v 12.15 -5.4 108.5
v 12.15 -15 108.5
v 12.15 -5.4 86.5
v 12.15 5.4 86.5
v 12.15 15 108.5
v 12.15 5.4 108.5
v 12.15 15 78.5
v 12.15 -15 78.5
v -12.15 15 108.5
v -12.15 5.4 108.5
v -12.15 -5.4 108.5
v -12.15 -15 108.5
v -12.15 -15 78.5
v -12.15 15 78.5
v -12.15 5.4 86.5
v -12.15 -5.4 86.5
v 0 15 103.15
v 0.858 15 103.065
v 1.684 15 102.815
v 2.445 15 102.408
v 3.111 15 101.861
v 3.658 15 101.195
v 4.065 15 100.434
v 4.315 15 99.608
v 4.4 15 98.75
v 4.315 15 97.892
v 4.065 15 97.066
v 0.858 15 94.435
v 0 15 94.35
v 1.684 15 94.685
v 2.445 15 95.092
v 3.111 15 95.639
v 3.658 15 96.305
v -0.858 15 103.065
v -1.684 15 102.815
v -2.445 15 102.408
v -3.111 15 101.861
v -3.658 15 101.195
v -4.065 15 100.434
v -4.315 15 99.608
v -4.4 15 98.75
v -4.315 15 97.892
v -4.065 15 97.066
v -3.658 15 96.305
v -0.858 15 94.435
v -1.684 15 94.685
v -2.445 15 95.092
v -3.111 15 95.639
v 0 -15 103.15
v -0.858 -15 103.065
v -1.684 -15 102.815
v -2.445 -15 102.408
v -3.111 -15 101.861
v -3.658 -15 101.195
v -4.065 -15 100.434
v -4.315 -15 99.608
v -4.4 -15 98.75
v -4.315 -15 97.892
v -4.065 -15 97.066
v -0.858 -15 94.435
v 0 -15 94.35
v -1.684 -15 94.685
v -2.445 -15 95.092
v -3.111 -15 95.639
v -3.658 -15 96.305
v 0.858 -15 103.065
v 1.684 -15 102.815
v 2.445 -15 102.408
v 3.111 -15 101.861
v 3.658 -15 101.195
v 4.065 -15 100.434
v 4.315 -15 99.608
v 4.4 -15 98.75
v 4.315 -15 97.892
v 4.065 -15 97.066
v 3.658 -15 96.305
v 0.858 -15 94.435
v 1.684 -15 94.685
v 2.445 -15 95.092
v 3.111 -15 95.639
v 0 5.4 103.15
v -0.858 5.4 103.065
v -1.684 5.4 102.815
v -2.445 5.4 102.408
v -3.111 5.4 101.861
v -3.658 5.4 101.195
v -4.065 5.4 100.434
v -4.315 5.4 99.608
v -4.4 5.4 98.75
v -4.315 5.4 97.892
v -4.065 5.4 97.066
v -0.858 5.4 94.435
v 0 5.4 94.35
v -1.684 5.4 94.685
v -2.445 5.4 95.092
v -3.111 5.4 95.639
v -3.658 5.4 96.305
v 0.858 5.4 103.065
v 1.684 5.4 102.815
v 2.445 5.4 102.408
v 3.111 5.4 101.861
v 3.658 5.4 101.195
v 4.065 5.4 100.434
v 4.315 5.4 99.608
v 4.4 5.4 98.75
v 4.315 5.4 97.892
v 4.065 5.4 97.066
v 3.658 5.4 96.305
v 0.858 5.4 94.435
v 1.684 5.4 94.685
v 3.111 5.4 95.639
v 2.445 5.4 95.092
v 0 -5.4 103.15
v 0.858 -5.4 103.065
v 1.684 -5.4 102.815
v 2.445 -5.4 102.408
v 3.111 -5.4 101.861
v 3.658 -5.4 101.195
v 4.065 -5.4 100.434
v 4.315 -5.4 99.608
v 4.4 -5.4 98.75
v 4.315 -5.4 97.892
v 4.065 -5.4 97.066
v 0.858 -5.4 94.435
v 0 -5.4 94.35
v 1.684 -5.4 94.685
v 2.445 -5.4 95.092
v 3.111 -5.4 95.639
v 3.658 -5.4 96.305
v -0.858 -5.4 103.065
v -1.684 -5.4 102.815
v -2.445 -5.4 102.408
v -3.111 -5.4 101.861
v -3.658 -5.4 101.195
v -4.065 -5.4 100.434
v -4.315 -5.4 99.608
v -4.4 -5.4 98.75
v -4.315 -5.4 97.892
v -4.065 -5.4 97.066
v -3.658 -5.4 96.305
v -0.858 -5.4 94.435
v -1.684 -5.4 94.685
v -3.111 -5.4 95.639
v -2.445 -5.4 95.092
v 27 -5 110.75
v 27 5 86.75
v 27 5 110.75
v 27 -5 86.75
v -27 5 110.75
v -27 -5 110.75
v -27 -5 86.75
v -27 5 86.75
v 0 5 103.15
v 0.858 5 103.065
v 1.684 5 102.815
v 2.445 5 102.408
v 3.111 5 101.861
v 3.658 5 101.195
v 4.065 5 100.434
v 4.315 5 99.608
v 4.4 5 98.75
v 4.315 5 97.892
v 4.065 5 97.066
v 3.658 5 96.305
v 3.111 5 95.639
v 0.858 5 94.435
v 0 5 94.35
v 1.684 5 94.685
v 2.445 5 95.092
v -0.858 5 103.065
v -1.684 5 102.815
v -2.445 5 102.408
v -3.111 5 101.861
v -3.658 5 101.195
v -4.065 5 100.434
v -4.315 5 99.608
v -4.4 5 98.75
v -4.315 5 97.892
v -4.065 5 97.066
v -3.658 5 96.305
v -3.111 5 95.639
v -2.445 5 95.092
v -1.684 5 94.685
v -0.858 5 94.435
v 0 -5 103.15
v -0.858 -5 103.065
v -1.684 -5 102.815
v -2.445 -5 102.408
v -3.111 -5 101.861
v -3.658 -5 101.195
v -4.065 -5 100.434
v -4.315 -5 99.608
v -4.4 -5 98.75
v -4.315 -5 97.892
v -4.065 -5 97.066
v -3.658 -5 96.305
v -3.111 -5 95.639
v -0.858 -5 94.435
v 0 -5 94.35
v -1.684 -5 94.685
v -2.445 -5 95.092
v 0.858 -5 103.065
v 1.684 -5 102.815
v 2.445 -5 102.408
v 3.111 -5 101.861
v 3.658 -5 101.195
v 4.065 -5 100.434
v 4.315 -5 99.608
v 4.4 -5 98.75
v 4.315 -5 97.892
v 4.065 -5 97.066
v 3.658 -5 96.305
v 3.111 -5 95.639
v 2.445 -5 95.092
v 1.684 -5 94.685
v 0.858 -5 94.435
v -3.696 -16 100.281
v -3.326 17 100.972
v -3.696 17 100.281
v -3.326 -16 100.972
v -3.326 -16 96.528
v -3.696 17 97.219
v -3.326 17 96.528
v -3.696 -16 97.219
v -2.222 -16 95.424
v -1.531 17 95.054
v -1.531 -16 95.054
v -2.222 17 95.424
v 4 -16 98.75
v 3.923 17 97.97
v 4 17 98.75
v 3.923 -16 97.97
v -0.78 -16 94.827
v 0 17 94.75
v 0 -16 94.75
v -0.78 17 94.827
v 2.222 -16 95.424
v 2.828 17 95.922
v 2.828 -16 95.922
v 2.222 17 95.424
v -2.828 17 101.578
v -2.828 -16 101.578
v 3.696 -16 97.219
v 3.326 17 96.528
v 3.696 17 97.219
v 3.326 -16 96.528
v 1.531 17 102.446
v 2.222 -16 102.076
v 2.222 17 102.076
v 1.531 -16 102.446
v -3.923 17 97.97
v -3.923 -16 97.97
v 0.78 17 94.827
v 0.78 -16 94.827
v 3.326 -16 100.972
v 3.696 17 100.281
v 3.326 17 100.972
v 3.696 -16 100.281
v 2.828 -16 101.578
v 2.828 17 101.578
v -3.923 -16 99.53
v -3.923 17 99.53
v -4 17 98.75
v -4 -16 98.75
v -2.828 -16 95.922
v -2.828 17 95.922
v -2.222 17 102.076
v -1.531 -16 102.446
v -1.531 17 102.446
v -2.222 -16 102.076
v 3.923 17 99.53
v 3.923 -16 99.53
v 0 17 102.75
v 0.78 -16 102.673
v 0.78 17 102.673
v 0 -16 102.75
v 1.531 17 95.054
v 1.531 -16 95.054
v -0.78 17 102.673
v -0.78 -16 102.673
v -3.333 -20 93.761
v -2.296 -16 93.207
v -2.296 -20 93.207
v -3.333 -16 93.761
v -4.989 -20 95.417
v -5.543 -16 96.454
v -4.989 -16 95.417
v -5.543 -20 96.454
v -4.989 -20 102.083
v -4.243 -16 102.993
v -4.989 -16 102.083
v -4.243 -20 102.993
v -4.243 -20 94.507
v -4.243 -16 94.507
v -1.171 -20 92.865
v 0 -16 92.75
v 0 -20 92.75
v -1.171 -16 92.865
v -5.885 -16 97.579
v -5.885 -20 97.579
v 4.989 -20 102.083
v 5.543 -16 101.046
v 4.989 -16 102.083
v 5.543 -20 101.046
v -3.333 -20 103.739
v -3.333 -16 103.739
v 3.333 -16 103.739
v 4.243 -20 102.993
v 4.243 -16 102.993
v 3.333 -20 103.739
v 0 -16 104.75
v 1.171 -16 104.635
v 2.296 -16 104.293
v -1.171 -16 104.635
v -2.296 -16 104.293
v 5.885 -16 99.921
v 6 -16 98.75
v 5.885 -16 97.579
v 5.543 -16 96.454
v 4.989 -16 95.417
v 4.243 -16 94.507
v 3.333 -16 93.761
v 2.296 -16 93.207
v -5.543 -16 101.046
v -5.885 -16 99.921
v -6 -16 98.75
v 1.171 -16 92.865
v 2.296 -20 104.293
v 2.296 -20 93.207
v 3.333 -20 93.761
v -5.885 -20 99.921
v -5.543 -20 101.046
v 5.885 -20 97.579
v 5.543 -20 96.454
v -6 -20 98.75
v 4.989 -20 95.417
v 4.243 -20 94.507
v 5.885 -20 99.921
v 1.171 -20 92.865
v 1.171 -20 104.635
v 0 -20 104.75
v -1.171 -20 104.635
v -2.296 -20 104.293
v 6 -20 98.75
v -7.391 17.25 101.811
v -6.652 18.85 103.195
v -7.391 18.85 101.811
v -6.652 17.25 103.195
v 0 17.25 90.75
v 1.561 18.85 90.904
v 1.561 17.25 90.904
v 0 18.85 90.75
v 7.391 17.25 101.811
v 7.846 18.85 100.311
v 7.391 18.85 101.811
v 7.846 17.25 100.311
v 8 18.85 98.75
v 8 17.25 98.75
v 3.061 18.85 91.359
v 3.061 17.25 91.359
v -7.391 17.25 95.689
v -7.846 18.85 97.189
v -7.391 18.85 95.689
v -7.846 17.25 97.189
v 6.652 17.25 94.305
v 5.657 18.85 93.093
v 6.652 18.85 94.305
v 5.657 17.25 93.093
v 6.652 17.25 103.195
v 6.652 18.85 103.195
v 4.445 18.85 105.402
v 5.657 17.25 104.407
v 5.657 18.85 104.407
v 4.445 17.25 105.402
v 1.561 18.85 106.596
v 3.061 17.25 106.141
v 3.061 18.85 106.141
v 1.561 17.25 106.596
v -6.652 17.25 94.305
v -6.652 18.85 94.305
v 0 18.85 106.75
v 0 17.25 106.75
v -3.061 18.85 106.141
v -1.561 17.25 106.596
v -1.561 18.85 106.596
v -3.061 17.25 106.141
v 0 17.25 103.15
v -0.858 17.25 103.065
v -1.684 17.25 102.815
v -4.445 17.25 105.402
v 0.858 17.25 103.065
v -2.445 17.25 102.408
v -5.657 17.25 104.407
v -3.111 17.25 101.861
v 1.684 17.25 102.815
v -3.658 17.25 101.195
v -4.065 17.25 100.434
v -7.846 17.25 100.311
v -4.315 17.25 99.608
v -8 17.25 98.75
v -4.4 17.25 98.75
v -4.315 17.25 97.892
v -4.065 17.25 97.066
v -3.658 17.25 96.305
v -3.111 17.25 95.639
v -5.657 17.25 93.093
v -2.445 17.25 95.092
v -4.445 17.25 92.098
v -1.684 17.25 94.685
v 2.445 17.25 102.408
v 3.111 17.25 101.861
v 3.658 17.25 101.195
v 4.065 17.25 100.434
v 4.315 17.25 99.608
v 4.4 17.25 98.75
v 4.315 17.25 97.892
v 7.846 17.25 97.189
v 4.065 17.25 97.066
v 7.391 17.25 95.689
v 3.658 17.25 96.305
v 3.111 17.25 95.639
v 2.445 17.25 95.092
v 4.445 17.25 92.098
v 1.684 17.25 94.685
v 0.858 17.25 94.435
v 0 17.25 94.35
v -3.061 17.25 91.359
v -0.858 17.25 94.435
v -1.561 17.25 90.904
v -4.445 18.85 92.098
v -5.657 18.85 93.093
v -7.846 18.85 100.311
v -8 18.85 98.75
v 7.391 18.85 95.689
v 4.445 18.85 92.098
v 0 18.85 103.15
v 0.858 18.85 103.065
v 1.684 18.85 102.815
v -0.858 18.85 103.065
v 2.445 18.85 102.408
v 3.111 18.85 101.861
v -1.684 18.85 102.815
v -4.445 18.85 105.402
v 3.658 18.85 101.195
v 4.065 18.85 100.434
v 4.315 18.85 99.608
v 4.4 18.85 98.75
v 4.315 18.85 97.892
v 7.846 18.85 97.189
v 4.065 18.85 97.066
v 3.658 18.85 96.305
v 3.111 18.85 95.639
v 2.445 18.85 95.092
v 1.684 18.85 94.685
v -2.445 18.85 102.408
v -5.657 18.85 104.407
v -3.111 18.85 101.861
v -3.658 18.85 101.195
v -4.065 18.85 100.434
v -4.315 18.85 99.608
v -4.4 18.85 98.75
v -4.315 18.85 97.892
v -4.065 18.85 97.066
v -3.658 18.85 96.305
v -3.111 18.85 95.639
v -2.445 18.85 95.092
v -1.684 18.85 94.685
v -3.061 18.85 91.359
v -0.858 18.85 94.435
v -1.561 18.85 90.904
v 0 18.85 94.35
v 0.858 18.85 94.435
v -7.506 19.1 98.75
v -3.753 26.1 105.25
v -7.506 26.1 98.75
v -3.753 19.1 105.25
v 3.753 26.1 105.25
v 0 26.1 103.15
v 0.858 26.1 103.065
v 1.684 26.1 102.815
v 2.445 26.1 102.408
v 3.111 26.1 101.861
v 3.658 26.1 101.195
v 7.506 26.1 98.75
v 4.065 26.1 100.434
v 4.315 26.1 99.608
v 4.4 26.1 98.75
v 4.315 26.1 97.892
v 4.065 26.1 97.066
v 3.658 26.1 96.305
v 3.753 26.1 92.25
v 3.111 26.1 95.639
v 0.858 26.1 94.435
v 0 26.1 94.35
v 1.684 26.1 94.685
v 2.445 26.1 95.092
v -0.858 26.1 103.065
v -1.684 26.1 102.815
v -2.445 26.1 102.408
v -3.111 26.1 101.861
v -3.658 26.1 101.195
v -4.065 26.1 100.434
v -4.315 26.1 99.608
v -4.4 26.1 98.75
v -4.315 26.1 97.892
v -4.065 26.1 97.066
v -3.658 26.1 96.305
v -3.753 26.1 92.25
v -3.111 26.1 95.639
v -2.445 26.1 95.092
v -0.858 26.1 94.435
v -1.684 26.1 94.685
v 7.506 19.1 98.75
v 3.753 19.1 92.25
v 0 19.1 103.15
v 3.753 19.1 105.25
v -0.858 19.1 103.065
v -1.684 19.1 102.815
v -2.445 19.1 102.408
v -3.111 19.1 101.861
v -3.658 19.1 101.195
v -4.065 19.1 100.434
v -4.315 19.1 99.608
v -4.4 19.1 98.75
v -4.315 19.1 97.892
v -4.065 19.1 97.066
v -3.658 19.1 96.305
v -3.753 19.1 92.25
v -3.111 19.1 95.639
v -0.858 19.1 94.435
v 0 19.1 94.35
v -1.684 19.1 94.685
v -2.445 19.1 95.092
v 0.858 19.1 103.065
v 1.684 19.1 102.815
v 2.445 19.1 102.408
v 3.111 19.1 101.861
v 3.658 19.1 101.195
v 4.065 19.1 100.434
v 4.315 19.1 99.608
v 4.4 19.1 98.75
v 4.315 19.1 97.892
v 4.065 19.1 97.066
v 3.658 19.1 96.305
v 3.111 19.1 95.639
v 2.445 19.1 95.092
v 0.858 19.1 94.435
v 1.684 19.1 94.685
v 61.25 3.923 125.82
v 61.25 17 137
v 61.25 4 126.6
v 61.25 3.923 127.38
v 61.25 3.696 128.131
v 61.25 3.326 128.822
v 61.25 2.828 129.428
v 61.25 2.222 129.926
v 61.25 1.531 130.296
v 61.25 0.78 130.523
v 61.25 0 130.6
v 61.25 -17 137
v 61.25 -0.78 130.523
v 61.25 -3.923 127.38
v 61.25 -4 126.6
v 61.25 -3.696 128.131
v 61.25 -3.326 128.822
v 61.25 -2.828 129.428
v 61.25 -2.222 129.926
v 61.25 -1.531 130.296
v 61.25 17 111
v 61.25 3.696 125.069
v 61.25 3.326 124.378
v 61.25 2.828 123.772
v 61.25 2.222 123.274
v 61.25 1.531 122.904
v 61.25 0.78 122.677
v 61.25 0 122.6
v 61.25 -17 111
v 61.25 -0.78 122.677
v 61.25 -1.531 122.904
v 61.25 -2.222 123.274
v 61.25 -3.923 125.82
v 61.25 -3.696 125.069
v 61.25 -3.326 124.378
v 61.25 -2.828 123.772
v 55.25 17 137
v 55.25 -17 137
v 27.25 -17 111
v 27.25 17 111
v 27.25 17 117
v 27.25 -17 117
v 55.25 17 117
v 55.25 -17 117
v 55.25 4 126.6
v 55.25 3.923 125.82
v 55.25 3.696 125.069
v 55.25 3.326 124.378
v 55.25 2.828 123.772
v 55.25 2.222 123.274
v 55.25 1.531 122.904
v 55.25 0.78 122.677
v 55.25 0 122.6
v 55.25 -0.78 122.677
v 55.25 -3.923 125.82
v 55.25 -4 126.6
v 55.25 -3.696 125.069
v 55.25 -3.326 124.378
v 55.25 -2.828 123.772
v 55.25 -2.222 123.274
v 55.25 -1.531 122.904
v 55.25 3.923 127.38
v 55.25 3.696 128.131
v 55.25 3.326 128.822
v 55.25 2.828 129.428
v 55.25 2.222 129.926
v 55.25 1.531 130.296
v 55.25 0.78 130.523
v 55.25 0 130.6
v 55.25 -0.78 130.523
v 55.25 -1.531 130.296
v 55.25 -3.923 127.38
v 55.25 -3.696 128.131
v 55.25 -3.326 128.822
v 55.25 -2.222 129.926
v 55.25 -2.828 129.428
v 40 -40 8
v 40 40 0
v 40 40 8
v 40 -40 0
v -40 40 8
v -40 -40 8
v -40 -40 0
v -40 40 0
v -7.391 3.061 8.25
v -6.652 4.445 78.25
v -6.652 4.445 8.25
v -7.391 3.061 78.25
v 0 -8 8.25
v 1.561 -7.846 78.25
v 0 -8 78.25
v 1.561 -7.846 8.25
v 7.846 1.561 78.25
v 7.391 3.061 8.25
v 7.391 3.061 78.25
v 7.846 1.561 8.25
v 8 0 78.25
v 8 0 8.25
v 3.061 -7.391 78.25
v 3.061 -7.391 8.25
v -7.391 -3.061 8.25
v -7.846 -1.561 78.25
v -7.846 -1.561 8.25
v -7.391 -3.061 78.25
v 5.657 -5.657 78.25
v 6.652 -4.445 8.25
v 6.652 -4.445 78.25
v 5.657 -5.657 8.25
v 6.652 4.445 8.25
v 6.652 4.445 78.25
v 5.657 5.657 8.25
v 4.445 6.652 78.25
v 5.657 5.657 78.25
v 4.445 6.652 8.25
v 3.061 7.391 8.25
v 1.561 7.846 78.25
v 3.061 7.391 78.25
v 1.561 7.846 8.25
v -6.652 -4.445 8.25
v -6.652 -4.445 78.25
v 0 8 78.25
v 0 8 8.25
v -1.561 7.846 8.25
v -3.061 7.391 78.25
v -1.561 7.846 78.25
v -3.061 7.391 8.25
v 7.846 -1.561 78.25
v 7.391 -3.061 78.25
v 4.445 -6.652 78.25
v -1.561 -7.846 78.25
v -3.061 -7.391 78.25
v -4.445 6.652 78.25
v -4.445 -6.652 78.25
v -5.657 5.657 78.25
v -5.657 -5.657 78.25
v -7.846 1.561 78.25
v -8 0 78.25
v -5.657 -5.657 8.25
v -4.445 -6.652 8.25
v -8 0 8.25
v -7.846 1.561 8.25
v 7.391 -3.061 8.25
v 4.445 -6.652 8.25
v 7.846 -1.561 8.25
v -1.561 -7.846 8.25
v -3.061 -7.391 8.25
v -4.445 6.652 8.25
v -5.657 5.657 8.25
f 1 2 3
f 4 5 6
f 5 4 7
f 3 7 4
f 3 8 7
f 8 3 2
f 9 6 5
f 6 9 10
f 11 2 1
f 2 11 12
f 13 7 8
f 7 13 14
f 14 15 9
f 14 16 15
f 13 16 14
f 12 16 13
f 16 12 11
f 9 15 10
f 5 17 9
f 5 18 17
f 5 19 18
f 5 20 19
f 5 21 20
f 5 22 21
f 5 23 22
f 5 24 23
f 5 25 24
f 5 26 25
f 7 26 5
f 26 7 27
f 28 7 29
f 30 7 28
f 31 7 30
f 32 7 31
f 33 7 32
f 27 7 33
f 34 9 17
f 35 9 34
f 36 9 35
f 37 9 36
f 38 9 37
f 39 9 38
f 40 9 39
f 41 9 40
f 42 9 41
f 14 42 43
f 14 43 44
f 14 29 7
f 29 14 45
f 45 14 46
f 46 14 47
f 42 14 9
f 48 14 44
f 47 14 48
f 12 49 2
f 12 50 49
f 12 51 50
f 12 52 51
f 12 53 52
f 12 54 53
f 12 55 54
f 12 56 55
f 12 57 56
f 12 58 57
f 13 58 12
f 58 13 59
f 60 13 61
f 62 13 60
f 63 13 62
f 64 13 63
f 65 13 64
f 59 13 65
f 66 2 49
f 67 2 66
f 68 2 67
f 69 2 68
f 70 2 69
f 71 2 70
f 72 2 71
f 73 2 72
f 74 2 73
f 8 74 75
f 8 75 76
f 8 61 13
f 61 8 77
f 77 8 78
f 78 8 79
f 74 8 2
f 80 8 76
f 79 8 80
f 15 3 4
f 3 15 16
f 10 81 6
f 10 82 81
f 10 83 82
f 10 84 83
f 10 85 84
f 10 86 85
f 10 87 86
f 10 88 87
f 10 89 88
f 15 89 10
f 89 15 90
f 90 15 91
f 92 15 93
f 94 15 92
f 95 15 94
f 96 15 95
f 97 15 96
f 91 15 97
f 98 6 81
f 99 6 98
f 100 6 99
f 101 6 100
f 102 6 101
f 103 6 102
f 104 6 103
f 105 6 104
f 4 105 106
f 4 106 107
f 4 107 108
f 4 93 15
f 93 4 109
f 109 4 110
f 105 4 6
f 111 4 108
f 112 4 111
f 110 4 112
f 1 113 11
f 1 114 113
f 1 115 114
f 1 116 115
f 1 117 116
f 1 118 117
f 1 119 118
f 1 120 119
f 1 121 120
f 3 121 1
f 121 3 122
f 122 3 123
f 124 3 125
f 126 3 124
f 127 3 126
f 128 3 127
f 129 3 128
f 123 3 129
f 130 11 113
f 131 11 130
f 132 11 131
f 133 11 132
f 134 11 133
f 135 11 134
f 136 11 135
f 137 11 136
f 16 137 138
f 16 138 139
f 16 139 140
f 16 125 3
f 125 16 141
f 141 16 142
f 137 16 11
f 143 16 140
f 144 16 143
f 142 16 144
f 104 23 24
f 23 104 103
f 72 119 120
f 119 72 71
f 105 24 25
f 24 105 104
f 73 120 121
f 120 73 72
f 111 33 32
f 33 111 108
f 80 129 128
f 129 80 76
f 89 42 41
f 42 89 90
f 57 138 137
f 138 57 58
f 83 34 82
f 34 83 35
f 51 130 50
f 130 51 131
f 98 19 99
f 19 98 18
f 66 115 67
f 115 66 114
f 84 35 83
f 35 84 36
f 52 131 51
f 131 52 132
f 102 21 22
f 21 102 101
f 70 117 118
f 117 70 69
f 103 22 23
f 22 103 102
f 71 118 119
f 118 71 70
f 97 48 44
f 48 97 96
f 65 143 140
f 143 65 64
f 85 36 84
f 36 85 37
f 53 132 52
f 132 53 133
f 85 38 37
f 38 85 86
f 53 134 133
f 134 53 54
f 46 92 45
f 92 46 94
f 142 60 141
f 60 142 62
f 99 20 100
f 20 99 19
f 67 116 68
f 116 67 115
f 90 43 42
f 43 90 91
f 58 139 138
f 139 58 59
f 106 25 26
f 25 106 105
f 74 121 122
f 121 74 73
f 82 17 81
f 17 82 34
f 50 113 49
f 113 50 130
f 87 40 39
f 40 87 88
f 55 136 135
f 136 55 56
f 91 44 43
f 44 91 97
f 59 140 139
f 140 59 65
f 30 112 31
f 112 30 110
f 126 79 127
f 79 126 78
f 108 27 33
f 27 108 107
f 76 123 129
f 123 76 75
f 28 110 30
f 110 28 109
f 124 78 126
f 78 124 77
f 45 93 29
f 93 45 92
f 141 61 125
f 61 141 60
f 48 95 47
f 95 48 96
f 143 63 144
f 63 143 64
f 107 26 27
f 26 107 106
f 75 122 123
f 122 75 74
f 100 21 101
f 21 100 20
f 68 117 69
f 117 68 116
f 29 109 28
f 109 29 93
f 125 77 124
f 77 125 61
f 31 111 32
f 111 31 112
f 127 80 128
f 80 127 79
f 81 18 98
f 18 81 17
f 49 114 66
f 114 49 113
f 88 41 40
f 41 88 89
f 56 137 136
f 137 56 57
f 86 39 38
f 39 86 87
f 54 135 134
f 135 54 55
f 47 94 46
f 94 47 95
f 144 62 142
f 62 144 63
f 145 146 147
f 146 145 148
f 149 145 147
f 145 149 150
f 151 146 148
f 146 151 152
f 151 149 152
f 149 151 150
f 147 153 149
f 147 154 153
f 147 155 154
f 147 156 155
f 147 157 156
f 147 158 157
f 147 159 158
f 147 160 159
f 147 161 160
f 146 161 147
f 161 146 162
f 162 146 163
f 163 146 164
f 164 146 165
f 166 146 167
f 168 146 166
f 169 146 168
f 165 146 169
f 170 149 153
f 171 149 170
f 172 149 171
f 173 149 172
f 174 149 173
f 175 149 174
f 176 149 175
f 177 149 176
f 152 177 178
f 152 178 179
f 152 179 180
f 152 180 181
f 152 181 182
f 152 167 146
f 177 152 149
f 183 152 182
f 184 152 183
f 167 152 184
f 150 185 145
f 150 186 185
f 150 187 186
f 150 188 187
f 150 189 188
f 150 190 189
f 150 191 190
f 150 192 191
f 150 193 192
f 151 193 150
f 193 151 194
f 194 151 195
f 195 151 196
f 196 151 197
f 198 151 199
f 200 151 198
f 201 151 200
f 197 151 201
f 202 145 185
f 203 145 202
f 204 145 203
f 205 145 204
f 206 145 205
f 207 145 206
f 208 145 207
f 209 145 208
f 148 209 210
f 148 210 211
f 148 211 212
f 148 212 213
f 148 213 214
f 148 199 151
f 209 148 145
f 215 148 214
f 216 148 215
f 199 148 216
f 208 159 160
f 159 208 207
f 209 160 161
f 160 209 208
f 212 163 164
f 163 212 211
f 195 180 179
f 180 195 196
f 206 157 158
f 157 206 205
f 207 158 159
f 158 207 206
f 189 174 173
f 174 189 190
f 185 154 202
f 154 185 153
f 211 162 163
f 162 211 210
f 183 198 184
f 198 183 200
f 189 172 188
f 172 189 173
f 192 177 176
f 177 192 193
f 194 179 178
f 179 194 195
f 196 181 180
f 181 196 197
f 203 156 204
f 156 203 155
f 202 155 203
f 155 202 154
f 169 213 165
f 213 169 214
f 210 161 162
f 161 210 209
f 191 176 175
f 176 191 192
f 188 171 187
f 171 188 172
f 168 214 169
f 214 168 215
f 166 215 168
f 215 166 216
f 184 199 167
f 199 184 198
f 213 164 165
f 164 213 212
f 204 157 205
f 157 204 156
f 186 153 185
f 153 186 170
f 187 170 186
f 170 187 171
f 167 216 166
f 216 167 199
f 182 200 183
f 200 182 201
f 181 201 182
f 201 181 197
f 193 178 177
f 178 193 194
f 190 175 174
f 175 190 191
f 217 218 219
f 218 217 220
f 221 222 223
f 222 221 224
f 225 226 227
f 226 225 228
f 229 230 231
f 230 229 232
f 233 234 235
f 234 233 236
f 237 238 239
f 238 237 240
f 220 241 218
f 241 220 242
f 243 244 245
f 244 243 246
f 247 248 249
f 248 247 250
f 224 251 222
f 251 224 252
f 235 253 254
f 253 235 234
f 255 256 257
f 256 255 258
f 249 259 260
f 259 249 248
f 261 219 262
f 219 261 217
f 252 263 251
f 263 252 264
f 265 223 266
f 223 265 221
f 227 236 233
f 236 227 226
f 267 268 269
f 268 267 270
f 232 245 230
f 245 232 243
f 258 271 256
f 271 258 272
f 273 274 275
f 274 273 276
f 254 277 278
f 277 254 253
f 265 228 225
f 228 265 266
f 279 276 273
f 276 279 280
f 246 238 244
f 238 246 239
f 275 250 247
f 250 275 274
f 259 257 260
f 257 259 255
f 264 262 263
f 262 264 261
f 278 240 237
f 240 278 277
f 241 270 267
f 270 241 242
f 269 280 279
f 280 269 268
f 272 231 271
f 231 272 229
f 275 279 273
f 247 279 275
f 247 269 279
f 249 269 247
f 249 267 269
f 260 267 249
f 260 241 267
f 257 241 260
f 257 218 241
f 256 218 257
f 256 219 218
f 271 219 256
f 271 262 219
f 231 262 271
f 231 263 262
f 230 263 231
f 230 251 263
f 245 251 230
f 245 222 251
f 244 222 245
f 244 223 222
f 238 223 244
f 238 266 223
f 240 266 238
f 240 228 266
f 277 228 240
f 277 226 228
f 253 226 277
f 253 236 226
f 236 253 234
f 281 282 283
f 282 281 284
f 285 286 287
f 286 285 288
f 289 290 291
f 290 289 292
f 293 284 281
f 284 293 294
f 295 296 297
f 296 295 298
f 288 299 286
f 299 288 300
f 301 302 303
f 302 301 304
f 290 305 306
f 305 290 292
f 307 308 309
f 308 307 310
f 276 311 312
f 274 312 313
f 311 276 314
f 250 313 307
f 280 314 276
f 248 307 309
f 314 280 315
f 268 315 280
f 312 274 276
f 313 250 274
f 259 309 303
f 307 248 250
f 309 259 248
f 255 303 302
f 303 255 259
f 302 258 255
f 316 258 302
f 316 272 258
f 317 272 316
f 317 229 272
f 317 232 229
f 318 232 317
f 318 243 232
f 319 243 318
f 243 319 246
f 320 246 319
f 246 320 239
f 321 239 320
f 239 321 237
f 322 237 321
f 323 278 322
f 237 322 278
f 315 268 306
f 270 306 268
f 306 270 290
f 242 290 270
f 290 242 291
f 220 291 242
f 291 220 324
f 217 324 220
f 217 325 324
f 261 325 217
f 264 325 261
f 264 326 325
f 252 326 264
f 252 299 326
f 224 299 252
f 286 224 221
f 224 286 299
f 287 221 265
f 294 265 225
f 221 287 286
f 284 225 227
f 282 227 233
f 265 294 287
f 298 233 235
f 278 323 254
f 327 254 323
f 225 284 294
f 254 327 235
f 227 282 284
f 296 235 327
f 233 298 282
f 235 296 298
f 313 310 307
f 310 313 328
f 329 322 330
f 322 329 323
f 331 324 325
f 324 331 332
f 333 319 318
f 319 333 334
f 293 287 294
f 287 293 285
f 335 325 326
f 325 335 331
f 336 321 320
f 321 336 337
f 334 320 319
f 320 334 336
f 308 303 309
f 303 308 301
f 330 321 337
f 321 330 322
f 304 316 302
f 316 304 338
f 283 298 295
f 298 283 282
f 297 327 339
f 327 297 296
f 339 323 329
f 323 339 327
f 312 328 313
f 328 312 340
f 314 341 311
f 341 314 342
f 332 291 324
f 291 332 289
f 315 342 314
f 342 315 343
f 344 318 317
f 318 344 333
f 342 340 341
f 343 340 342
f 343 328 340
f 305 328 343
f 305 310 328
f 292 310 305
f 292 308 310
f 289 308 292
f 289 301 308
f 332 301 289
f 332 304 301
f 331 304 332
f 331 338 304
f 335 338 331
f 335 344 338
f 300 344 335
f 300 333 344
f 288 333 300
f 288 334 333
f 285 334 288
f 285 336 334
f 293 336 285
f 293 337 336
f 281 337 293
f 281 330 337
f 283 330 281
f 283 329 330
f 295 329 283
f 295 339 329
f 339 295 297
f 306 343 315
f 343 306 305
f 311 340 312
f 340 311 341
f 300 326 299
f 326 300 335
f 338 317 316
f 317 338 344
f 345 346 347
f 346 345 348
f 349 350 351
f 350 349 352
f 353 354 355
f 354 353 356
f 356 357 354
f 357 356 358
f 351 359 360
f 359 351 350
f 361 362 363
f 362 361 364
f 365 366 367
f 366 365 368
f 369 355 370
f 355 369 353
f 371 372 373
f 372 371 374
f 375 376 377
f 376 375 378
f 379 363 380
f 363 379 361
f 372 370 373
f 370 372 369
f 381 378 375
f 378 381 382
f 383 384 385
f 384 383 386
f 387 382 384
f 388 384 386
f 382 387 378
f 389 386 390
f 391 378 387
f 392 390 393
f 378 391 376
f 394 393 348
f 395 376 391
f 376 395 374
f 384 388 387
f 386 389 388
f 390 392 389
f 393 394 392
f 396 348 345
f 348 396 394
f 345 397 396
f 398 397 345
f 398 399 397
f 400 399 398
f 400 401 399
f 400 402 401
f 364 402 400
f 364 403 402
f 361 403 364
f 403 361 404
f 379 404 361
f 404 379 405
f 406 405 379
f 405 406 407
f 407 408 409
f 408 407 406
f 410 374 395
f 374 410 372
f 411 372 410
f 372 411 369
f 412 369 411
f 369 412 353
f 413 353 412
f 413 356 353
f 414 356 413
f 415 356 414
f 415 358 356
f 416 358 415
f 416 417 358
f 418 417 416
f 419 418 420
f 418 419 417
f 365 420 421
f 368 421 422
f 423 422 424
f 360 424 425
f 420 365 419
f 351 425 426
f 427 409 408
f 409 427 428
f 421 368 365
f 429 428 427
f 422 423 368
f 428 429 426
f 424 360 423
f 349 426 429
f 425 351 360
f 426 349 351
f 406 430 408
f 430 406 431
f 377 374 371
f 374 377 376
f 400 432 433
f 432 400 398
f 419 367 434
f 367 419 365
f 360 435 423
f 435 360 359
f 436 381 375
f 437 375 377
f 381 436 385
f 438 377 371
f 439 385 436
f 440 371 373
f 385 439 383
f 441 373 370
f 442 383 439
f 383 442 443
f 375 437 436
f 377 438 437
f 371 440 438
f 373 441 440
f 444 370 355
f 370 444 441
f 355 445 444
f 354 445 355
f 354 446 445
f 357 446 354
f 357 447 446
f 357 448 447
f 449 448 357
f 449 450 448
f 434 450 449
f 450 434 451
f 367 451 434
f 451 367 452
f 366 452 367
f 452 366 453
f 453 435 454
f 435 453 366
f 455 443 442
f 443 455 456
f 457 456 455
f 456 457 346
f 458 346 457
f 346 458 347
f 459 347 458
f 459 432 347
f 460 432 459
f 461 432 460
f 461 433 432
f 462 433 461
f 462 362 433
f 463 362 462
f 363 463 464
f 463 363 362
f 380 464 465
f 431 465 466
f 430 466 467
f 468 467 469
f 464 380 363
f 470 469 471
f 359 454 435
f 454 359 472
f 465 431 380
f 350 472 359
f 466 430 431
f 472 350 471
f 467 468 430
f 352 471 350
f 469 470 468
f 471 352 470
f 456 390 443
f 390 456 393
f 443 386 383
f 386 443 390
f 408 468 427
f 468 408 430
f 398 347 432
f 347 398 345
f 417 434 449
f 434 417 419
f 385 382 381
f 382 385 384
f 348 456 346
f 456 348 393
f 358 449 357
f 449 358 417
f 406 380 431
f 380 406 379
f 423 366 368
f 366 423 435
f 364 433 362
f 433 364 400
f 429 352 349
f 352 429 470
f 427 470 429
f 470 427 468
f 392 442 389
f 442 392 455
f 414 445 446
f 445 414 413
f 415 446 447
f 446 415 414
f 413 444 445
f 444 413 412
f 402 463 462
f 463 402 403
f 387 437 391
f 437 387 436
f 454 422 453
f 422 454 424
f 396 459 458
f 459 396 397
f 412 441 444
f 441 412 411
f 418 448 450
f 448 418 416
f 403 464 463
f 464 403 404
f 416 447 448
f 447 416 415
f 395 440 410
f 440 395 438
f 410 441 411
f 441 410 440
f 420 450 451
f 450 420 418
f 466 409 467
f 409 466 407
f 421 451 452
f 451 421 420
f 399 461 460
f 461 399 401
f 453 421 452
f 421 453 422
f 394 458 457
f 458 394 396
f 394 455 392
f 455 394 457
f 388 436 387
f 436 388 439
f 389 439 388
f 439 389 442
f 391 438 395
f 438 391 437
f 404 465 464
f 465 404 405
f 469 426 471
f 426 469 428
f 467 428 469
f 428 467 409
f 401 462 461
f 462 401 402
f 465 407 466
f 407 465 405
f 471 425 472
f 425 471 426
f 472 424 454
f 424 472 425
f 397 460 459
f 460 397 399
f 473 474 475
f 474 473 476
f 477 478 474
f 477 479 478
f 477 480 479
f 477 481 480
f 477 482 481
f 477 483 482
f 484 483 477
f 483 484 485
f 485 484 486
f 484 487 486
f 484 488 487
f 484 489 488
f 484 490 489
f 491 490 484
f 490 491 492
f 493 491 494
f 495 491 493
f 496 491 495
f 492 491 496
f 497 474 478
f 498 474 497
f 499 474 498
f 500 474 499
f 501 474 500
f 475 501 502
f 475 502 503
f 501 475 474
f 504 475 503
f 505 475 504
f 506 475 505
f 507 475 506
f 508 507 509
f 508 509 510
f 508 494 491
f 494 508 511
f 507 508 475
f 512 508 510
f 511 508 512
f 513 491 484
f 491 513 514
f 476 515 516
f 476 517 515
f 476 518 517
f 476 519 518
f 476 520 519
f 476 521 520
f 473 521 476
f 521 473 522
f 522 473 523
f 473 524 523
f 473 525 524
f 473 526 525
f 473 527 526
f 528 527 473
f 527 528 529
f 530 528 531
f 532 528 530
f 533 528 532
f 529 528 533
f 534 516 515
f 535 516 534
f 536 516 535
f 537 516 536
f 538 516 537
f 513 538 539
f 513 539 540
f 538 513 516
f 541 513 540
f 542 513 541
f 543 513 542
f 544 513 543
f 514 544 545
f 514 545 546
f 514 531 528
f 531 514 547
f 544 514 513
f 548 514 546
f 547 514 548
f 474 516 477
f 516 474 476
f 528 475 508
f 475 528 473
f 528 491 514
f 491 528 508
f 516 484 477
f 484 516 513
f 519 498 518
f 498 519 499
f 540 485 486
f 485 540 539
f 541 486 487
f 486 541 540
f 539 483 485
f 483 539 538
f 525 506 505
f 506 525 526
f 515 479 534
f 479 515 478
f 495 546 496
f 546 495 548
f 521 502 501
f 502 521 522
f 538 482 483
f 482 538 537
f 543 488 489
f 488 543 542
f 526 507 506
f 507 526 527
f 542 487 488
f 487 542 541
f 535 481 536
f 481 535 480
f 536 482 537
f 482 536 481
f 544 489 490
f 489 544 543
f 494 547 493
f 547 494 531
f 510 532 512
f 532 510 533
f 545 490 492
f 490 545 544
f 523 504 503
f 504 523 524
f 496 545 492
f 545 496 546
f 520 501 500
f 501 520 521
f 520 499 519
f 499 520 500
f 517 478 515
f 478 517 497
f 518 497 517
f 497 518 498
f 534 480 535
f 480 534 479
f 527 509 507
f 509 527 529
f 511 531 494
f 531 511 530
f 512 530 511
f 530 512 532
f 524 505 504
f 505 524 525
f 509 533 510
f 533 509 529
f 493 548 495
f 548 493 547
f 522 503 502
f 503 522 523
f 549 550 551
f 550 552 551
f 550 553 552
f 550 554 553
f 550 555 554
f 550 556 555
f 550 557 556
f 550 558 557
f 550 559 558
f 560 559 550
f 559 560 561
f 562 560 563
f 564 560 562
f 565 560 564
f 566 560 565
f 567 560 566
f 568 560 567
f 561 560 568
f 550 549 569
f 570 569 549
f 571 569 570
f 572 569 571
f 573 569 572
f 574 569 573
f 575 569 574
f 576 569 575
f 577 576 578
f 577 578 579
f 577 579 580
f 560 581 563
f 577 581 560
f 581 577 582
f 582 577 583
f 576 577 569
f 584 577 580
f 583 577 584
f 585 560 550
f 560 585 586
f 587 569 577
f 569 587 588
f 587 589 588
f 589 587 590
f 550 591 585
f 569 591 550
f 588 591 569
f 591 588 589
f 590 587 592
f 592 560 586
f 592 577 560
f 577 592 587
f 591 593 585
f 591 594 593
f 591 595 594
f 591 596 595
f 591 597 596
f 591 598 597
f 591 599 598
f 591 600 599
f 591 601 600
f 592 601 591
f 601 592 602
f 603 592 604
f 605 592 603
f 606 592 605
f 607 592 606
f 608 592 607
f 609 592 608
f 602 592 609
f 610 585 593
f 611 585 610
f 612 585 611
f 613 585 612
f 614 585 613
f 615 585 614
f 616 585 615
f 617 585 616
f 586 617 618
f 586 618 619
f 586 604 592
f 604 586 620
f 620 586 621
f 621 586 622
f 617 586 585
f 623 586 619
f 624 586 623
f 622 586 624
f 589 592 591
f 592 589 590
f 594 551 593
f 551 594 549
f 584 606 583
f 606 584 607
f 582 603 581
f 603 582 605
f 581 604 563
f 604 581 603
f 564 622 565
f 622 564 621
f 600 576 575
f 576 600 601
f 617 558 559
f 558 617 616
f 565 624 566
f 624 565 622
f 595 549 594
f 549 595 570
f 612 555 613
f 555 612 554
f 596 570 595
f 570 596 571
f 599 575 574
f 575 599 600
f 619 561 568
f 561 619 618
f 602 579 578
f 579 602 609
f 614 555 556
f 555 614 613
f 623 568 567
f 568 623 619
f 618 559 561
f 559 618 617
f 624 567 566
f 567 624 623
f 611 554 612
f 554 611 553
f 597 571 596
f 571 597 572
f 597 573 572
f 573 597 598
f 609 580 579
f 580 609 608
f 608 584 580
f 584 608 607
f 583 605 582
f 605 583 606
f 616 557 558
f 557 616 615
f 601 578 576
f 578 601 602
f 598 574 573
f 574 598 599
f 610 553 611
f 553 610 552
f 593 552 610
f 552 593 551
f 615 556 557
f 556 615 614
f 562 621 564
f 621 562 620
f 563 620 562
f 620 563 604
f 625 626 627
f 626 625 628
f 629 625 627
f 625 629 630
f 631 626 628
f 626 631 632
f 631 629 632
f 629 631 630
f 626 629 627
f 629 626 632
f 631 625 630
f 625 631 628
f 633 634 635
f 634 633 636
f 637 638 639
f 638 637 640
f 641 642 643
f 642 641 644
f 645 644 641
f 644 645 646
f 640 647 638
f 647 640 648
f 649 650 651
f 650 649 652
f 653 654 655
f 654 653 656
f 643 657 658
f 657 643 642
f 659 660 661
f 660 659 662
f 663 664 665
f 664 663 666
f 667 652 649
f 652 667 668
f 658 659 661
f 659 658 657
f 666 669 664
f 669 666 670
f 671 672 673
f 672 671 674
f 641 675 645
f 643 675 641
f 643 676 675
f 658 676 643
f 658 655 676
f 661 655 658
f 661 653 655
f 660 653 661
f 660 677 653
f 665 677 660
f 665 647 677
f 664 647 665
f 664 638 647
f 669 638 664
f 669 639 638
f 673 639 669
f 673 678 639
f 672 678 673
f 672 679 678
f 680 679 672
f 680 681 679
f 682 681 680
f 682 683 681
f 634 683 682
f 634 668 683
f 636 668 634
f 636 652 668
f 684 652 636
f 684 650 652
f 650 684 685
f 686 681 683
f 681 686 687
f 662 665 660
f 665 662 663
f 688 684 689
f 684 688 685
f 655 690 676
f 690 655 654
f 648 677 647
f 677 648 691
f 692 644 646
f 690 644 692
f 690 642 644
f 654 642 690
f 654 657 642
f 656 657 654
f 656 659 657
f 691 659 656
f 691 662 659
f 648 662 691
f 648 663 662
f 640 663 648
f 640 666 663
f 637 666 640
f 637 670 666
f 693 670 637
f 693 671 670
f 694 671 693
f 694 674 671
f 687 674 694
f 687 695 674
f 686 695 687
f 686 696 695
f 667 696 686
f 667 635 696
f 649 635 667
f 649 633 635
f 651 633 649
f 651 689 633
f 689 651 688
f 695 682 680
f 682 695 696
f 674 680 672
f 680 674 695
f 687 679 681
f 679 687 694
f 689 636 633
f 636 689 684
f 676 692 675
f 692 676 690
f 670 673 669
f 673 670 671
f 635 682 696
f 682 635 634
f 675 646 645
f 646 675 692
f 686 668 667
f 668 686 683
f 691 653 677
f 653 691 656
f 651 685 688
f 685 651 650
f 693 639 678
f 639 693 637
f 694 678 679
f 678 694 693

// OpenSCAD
$fn = 32;

// ------------------------------------------------------------------------
// Lamp arm: column d16 x 70 mm, arm 54 mm
// Every part is its own module, assembly() places every instance.
// ------------------------------------------------------------------------

// --- part 1 ---
module lamp_base() {
  difference() {
    translate([-40, -40, 0]) cube([80, 80, 8]);
  }
}

// --- part 2 ---
module lamp_column() {
  cylinder(h = 70, d = 16);
}

// --- part 3 ---
module head_fork() {
  difference() {
    translate([-12.15, -15, 0]) cube([24.3, 30, 30]);
    translate([-13.15, -5.4, 8]) cube([26.3, 10.8, 23]);
    translate([0, 0, 20.25]) rotate([90, 0, 0]) cylinder(h = 32, d = 8.8, center = true);
  }
}

// --- part 4 ---
module lamp_arm() {
  difference() {
    translate([-27, -5, 0]) cube([54, 10, 24]);
    translate([0, 0, 12]) rotate([90, 0, 0]) cylinder(h = 12, d = 8.8, center = true);
  }
}

// --- part 5 ---
module arm_pin() {
  rotate([0, 90, 0]) cylinder(h = 34, d = 8, center = true);
  translate([-20, 0, 0]) rotate([0, 90, 0]) cylinder(h = 4, d = 12);
}

// --- part 6 ---
module arm_washer() {
  difference() {
      translate([0, 0, 0]) cylinder(h = 1.6, d = 16);
      translate([0, 0, -1]) cylinder(h = 3.6, d = 8.8);
    }
}

// --- part 7 ---
module arm_nut() {
  difference() {
    linear_extrude(height = 7) polygon(points = [[7.506, 0], [3.753, 6.5], [-3.753, 6.5], [-7.506, 0], [-3.753, -6.5], [3.753, -6.5]]);
    translate([0, 0, -1]) cylinder(h = 9, d = 8.8);
  }
}

// --- part 8 ---
module shade_bracket() {
  difference() {
    translate([-17, -17, 0]) cube([34, 34, 26]);
    translate([-18, -18, 6]) cube([29, 36, 21]);
    translate([14, 0, 15.6]) rotate([0, 90, 0]) cylinder(h = 8, d = 8, center = true);
  }
}

// --- assembly ---
module assembly() {
  color([0.80, 0.24, 0.20]) translate([0, 0, 0]) rotate([0, 0, 0]) lamp_base();
  color([0.20, 0.45, 0.75]) translate([0, 0, 8.25]) rotate([0, 0, 0]) lamp_column();
  color([0.25, 0.62, 0.32]) translate([0, 0, 78.5]) rotate([0, 0, 0]) head_fork();
  color([0.92, 0.70, 0.18]) translate([0, 0, 86.75]) rotate([0, 0, 0]) lamp_arm();
  color([0.58, 0.35, 0.70]) translate([0, 0, 98.75]) rotate([0, 0, 90]) arm_pin();
  color([0.16, 0.66, 0.66]) translate([0, 18.85, 98.75]) rotate([90, 0, 0]) arm_washer();
  color([0.85, 0.48, 0.18]) translate([0, 26.1, 98.75]) rotate([90, 0, 0]) arm_nut();
  color([0.55, 0.60, 0.65]) translate([44.25, 0, 111]) rotate([0, 0, 0]) shade_bracket();
}

assembly();
